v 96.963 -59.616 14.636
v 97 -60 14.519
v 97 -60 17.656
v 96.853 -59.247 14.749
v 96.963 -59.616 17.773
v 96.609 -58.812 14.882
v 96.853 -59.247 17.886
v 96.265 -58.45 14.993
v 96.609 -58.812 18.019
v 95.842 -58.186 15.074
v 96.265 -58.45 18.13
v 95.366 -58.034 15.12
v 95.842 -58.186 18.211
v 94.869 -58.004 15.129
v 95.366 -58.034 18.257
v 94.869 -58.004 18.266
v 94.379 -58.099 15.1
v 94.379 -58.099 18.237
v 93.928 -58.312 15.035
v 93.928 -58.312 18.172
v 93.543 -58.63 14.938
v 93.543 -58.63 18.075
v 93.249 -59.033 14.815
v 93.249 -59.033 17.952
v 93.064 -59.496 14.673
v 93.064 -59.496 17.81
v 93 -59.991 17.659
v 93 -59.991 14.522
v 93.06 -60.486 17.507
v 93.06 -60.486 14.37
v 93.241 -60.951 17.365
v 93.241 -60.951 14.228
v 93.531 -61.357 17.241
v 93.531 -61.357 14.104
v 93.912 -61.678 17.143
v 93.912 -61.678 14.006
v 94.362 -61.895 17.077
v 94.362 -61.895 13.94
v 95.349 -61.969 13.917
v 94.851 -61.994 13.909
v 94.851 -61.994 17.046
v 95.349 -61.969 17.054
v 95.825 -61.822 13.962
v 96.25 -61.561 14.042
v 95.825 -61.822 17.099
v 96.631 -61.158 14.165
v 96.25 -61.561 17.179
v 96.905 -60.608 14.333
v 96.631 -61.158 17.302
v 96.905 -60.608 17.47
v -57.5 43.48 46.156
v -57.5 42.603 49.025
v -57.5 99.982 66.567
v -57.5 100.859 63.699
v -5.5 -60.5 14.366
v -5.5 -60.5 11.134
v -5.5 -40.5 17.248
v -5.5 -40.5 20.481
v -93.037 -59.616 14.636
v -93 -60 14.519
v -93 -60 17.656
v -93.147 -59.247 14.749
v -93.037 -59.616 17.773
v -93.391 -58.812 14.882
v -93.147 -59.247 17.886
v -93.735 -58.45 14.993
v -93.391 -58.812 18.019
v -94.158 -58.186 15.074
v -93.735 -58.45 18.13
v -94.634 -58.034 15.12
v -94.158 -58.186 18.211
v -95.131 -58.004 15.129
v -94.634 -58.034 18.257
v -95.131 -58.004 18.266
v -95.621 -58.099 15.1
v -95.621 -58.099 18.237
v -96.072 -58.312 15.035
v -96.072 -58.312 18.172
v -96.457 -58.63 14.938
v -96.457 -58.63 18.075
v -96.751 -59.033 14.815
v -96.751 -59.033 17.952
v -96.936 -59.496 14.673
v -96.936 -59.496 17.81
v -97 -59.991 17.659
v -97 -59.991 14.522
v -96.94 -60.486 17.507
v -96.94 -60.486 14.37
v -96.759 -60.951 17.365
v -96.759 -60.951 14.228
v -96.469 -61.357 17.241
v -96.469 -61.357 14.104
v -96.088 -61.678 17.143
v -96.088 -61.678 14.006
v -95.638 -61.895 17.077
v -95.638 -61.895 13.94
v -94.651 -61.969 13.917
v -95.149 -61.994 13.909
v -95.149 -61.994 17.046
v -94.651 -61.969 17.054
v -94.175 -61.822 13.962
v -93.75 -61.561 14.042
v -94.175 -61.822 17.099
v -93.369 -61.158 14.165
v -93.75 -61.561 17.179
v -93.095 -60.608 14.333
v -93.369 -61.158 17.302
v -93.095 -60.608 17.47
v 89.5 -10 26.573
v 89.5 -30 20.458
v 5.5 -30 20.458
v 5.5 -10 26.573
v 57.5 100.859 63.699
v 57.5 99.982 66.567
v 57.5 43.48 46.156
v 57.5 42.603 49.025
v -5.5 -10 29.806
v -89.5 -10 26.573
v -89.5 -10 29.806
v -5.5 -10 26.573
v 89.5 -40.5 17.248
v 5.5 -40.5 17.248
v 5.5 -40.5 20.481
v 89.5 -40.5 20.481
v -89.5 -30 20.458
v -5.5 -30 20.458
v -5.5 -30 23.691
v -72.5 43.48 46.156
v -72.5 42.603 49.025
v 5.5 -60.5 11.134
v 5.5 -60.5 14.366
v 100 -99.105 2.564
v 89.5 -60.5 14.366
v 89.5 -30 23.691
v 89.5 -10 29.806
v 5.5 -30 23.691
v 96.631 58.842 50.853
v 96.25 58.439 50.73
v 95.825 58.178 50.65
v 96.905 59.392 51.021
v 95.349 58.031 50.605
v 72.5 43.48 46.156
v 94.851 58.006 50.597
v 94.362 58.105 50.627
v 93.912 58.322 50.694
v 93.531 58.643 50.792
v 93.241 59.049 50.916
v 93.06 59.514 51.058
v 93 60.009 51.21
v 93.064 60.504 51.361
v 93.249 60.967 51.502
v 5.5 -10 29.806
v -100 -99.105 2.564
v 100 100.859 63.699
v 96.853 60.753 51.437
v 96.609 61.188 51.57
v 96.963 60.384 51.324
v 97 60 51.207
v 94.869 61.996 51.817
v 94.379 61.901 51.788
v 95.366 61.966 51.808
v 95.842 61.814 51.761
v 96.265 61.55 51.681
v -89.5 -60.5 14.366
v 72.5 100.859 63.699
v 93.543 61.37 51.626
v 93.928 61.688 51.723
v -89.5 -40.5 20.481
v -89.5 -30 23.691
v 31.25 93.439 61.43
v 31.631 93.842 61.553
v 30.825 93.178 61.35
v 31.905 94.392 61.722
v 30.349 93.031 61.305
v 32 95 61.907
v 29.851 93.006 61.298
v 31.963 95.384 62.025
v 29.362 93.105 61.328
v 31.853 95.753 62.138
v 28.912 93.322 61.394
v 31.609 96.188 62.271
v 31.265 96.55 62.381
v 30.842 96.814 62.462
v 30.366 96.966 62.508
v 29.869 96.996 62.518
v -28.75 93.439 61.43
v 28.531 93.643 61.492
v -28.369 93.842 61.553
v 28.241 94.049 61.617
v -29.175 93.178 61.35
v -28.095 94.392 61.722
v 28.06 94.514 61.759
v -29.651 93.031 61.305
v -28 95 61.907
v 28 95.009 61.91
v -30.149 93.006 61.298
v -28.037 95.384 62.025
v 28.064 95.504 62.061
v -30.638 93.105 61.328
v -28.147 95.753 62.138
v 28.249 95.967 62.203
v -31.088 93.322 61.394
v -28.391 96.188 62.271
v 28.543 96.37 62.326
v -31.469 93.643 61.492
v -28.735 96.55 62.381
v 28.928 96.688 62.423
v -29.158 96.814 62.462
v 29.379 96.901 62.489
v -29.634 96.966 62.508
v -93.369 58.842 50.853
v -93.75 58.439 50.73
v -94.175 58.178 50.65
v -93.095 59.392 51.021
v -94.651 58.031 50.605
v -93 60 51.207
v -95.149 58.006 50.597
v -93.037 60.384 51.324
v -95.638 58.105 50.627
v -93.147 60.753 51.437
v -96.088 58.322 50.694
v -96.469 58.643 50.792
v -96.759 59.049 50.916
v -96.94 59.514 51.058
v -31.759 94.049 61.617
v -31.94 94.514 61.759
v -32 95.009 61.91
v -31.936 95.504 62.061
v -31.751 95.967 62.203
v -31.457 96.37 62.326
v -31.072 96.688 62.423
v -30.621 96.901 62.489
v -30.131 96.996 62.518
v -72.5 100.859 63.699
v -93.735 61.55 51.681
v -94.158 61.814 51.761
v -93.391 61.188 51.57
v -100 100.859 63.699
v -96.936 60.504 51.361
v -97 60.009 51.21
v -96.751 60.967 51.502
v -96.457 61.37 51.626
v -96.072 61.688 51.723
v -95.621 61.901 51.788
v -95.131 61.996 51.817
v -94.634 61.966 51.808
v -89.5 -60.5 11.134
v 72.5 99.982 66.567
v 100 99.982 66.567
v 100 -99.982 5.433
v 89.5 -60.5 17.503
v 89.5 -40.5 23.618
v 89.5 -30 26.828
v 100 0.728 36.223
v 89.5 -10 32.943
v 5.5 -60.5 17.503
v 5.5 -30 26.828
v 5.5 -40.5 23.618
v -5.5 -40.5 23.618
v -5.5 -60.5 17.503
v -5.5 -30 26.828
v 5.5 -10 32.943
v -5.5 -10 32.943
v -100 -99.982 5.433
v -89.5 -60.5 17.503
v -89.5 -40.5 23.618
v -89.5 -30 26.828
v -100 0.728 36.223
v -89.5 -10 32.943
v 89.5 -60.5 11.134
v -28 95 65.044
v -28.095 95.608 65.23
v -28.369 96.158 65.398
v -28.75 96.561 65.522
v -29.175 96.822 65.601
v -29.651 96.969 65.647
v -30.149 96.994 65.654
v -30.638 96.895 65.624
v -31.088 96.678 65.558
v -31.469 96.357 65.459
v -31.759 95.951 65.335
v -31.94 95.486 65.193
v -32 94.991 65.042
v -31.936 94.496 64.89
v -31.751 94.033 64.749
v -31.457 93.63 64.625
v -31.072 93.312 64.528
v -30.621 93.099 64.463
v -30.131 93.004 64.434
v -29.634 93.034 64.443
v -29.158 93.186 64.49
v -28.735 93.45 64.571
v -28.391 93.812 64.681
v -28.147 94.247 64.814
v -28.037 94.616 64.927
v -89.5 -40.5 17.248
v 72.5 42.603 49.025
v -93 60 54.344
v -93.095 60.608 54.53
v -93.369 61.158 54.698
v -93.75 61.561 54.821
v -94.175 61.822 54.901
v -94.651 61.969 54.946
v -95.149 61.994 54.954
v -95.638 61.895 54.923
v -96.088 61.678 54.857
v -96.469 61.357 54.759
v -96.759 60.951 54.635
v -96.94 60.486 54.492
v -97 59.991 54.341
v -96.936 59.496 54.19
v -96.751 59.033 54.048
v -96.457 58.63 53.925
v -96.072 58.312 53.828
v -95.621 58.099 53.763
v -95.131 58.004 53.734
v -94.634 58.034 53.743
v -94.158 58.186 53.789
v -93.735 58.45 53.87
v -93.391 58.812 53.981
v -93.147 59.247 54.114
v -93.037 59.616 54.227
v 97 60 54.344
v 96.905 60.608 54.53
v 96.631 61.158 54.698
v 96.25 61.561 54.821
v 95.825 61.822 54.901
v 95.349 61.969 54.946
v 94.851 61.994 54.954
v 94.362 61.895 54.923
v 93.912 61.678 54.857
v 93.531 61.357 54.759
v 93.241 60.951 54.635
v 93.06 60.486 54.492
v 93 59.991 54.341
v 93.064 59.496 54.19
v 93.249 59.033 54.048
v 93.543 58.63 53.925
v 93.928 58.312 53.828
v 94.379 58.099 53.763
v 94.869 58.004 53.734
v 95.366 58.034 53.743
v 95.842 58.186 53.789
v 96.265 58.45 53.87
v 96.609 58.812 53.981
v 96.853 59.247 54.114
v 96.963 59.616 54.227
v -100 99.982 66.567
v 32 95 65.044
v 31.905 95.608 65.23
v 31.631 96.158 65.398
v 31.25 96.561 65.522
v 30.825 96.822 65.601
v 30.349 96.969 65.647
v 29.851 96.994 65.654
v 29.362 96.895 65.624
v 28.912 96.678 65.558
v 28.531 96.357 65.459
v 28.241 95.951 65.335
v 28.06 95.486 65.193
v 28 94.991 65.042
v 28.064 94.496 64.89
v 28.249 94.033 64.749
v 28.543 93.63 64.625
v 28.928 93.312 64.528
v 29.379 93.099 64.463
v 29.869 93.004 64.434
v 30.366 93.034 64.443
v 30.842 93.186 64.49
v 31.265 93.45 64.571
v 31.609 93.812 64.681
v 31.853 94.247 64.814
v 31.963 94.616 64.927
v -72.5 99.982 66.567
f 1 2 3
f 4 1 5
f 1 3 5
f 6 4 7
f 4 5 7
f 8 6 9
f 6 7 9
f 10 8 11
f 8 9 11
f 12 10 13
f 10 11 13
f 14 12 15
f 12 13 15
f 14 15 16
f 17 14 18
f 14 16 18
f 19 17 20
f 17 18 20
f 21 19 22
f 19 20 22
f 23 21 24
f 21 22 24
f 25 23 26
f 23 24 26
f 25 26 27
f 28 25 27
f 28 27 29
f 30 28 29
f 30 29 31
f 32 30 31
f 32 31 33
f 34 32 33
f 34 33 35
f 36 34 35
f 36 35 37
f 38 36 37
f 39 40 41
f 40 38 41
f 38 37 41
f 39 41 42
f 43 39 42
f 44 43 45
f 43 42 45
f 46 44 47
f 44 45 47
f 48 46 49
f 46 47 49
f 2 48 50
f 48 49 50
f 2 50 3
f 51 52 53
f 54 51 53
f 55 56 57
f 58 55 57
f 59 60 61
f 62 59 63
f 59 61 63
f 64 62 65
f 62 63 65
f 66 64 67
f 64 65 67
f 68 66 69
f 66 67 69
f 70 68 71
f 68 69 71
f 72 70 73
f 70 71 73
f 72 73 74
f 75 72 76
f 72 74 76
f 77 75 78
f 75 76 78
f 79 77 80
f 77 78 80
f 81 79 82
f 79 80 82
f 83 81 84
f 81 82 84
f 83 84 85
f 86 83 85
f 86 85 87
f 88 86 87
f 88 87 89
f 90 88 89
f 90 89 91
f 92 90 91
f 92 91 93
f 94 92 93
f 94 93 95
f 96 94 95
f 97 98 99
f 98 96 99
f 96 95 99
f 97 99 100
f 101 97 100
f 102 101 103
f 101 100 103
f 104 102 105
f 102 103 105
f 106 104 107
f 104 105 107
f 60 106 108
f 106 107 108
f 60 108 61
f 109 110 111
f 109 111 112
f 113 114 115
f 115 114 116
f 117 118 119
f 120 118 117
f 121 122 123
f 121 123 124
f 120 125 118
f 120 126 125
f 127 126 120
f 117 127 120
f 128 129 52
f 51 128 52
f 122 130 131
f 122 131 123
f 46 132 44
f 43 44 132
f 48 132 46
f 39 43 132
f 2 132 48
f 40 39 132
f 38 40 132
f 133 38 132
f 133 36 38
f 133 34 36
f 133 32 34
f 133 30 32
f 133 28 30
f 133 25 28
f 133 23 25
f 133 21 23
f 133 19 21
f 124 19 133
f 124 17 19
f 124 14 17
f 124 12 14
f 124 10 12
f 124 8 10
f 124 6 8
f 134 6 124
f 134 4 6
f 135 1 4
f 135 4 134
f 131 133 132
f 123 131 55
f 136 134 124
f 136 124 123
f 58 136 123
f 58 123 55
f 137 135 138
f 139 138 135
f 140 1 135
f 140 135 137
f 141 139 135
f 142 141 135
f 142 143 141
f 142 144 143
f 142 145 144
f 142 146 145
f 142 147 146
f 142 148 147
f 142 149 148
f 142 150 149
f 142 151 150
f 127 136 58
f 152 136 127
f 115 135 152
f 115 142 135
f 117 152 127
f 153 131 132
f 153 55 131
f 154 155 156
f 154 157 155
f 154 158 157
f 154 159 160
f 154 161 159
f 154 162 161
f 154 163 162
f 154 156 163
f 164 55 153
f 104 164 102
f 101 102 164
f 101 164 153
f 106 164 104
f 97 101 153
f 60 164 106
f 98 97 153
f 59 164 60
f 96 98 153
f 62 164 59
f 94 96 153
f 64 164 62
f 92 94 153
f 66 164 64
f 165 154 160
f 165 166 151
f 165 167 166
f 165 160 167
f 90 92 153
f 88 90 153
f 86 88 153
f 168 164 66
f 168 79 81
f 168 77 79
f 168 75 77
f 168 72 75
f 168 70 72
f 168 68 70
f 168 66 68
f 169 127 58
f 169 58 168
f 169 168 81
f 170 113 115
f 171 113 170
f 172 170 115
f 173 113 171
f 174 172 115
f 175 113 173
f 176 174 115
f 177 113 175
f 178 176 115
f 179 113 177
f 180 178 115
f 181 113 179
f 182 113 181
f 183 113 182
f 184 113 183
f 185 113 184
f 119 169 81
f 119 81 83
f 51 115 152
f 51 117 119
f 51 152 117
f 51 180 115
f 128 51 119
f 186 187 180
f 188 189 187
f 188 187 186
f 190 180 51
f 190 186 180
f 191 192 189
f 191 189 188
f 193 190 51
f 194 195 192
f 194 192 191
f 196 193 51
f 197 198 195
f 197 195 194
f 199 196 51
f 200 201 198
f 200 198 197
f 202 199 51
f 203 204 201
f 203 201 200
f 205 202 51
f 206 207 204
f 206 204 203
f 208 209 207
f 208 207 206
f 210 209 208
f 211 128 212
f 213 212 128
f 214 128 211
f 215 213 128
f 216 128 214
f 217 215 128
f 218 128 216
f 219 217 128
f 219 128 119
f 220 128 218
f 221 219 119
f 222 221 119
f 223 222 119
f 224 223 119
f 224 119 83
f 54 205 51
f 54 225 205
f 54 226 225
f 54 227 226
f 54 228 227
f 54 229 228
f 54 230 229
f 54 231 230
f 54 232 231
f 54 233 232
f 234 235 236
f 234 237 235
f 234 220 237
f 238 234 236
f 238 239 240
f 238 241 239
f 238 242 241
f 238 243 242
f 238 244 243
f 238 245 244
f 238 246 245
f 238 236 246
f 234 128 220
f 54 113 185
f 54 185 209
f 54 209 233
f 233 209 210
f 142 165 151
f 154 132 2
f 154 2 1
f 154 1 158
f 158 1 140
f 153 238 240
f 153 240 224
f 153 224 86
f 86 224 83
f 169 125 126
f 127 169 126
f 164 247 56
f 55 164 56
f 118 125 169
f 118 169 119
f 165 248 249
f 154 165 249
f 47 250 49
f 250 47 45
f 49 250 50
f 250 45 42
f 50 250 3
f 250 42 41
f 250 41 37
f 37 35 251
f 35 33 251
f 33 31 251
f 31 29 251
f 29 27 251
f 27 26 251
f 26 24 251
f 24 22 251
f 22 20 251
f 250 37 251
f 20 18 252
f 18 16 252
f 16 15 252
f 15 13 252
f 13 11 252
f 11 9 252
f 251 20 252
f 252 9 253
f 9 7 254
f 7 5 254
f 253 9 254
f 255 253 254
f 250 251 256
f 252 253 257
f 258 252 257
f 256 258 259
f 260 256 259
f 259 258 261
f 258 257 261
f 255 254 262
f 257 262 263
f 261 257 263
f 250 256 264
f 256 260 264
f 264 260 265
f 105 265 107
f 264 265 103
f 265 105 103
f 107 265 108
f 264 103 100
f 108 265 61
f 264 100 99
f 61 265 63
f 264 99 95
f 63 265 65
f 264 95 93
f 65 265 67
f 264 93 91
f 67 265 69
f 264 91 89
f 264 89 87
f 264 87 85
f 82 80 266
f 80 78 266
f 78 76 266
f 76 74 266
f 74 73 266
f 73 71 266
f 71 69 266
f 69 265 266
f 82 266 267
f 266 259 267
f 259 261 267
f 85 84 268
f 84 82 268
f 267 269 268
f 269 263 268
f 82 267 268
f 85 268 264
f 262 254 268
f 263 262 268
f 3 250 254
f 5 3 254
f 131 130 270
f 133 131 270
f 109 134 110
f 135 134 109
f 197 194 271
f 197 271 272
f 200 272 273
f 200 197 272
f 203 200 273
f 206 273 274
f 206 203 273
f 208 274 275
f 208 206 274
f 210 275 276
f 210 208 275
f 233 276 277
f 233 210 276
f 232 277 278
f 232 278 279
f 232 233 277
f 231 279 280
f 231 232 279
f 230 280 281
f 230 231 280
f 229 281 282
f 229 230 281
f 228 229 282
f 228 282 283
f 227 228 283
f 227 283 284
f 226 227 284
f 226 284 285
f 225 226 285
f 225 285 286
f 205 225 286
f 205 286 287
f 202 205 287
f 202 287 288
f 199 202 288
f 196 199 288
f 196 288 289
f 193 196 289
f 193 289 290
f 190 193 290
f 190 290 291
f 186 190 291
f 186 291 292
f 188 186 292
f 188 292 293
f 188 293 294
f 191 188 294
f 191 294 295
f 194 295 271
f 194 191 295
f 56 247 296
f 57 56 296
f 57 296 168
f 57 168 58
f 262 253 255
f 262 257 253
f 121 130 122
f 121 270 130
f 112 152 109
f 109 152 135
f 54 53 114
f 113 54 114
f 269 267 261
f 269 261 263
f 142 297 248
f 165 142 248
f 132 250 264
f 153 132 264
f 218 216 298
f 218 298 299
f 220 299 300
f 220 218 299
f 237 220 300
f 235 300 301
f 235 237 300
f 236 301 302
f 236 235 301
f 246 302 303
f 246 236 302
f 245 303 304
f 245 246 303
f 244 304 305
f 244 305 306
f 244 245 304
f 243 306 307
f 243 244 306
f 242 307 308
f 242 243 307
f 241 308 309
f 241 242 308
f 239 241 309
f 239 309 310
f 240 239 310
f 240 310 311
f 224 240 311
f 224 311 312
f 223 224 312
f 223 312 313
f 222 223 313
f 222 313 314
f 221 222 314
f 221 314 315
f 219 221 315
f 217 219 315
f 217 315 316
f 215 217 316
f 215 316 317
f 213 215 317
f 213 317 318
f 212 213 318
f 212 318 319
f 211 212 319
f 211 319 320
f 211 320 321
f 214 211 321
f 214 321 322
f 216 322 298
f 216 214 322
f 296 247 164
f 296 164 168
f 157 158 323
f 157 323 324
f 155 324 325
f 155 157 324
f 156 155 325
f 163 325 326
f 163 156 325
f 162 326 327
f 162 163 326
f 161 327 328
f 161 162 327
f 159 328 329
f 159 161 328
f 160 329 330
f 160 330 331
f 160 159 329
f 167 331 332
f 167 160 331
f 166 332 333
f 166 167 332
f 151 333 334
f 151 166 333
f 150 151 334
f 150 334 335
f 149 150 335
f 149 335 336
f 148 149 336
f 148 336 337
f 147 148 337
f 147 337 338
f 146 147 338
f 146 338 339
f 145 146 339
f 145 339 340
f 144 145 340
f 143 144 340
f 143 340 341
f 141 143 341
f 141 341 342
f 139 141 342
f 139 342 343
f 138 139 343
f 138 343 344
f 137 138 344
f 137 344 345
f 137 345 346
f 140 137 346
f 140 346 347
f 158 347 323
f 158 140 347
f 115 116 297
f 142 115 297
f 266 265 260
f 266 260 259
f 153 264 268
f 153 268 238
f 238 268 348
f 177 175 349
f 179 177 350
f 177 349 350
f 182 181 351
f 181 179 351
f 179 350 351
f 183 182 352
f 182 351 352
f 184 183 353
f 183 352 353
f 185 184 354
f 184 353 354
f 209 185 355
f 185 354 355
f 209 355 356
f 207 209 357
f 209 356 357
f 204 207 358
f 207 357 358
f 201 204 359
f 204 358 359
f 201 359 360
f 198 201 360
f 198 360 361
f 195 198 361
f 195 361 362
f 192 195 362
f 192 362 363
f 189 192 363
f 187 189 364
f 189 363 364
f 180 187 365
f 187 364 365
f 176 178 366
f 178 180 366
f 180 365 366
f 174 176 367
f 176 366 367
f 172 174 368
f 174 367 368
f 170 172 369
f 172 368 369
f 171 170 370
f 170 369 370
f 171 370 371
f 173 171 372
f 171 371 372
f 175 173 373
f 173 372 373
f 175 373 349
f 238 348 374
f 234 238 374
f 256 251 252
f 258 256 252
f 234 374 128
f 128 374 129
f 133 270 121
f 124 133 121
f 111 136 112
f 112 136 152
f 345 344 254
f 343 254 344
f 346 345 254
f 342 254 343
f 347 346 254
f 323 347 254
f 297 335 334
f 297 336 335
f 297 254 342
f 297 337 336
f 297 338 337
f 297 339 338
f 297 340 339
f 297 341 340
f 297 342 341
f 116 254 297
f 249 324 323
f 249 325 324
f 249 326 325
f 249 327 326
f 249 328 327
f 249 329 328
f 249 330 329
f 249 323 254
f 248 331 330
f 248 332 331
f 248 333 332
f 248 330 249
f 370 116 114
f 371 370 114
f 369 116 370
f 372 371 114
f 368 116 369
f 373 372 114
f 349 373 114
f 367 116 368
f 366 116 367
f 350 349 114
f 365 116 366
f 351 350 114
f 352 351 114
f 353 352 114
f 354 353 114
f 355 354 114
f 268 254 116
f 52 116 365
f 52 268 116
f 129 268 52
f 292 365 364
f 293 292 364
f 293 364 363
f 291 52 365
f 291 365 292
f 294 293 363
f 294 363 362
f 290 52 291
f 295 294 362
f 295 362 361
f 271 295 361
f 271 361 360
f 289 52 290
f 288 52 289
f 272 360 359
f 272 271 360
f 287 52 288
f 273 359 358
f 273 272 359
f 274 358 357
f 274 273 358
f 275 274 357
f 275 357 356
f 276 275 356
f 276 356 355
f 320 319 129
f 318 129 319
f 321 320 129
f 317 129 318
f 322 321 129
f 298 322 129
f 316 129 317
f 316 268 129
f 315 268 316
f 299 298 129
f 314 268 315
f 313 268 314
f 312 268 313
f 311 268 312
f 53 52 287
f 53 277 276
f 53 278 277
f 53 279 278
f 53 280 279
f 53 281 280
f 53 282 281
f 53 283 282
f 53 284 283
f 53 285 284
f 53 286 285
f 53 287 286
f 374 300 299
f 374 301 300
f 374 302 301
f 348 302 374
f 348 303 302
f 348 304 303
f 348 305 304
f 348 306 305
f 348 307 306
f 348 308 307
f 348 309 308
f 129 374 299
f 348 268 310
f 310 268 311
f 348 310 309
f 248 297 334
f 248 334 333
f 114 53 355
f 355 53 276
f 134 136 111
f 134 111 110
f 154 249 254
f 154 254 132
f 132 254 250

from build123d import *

# Parameters (mm, degrees)
PAD032_DEPTH    = 3
SKETCH060_W     = 84
SKETCH060_H     = 20
PAD031_DEPTH    = 30
SKETCH062_R     = 2
POCKET023_DEPTH = 250
POCKET022_DEPTH = 250


with BuildPart() as part:
    # Sketch063 → Pad032 (new body)
    with BuildSketch(Plane(origin=(0, 0, 0), x_dir=(1, 0, 0), z_dir=(0, -0.292372, 0.956305))):
        Polygon((-100, 104.55), (-72.5, 104.55), (-72.5, 44.55), (-57.5, 44.55), (-57.5, 104.55), (57.5, 104.55), (57.5, 44.55), (72.5, 44.55), (72.5, 104.55), (100, 104.55), (100, -104.55), (-100, -104.55), align=None)
    extrude(amount=-PAD032_DEPTH)

    # Sketch060 → Pad031 (join, symmetric)
    with BuildSketch(Plane.XY):
        with Locations((-47.5, -50.5)):
            Rectangle(SKETCH060_W, SKETCH060_H)
        with Locations((47.5, -50.5)):
            Rectangle(SKETCH060_W, SKETCH060_H)
        with Locations((-47.5, -20)):
            Rectangle(SKETCH060_W, SKETCH060_H)
        with Locations((47.5, -20)):
            Rectangle(SKETCH060_W, SKETCH060_H)
    extrude(amount=PAD031_DEPTH, both=True)

    # Sketch062 → Pocket023 (cut, symmetric)
    with BuildSketch(Plane.XY):
        with Locations((-95, 60)):
            Circle(SKETCH062_R)
        with Locations((-95, -60)):
            Circle(SKETCH062_R)
        with Locations((95, -60)):
            Circle(SKETCH062_R)
        with Locations((95, 60)):
            Circle(SKETCH062_R)
        with Locations((-30, 95)):
            Circle(SKETCH062_R)
        with Locations((30, 95)):
            Circle(SKETCH062_R)
    extrude(amount=POCKET023_DEPTH, both=True, mode=Mode.SUBTRACT)

    # Sketch061 → Pocket022 (cut, symmetric)
    with BuildSketch(Plane.YZ):
        Polygon((-110, -33.630375), (130, 39.744989), (130, 89.744989), (-110, 16.369625), align=None)
        Polygon((-110, -40), (130, 33.375364), (130, -16.624636), (-110, -90), align=None)
    extrude(amount=POCKET022_DEPTH, both=True, mode=Mode.SUBTRACT)


with BuildPart() as part_1:
    # Body012 placement: moved
    add(part.part.moved(Location((0, 0, 36))))


solid = part_1.part
